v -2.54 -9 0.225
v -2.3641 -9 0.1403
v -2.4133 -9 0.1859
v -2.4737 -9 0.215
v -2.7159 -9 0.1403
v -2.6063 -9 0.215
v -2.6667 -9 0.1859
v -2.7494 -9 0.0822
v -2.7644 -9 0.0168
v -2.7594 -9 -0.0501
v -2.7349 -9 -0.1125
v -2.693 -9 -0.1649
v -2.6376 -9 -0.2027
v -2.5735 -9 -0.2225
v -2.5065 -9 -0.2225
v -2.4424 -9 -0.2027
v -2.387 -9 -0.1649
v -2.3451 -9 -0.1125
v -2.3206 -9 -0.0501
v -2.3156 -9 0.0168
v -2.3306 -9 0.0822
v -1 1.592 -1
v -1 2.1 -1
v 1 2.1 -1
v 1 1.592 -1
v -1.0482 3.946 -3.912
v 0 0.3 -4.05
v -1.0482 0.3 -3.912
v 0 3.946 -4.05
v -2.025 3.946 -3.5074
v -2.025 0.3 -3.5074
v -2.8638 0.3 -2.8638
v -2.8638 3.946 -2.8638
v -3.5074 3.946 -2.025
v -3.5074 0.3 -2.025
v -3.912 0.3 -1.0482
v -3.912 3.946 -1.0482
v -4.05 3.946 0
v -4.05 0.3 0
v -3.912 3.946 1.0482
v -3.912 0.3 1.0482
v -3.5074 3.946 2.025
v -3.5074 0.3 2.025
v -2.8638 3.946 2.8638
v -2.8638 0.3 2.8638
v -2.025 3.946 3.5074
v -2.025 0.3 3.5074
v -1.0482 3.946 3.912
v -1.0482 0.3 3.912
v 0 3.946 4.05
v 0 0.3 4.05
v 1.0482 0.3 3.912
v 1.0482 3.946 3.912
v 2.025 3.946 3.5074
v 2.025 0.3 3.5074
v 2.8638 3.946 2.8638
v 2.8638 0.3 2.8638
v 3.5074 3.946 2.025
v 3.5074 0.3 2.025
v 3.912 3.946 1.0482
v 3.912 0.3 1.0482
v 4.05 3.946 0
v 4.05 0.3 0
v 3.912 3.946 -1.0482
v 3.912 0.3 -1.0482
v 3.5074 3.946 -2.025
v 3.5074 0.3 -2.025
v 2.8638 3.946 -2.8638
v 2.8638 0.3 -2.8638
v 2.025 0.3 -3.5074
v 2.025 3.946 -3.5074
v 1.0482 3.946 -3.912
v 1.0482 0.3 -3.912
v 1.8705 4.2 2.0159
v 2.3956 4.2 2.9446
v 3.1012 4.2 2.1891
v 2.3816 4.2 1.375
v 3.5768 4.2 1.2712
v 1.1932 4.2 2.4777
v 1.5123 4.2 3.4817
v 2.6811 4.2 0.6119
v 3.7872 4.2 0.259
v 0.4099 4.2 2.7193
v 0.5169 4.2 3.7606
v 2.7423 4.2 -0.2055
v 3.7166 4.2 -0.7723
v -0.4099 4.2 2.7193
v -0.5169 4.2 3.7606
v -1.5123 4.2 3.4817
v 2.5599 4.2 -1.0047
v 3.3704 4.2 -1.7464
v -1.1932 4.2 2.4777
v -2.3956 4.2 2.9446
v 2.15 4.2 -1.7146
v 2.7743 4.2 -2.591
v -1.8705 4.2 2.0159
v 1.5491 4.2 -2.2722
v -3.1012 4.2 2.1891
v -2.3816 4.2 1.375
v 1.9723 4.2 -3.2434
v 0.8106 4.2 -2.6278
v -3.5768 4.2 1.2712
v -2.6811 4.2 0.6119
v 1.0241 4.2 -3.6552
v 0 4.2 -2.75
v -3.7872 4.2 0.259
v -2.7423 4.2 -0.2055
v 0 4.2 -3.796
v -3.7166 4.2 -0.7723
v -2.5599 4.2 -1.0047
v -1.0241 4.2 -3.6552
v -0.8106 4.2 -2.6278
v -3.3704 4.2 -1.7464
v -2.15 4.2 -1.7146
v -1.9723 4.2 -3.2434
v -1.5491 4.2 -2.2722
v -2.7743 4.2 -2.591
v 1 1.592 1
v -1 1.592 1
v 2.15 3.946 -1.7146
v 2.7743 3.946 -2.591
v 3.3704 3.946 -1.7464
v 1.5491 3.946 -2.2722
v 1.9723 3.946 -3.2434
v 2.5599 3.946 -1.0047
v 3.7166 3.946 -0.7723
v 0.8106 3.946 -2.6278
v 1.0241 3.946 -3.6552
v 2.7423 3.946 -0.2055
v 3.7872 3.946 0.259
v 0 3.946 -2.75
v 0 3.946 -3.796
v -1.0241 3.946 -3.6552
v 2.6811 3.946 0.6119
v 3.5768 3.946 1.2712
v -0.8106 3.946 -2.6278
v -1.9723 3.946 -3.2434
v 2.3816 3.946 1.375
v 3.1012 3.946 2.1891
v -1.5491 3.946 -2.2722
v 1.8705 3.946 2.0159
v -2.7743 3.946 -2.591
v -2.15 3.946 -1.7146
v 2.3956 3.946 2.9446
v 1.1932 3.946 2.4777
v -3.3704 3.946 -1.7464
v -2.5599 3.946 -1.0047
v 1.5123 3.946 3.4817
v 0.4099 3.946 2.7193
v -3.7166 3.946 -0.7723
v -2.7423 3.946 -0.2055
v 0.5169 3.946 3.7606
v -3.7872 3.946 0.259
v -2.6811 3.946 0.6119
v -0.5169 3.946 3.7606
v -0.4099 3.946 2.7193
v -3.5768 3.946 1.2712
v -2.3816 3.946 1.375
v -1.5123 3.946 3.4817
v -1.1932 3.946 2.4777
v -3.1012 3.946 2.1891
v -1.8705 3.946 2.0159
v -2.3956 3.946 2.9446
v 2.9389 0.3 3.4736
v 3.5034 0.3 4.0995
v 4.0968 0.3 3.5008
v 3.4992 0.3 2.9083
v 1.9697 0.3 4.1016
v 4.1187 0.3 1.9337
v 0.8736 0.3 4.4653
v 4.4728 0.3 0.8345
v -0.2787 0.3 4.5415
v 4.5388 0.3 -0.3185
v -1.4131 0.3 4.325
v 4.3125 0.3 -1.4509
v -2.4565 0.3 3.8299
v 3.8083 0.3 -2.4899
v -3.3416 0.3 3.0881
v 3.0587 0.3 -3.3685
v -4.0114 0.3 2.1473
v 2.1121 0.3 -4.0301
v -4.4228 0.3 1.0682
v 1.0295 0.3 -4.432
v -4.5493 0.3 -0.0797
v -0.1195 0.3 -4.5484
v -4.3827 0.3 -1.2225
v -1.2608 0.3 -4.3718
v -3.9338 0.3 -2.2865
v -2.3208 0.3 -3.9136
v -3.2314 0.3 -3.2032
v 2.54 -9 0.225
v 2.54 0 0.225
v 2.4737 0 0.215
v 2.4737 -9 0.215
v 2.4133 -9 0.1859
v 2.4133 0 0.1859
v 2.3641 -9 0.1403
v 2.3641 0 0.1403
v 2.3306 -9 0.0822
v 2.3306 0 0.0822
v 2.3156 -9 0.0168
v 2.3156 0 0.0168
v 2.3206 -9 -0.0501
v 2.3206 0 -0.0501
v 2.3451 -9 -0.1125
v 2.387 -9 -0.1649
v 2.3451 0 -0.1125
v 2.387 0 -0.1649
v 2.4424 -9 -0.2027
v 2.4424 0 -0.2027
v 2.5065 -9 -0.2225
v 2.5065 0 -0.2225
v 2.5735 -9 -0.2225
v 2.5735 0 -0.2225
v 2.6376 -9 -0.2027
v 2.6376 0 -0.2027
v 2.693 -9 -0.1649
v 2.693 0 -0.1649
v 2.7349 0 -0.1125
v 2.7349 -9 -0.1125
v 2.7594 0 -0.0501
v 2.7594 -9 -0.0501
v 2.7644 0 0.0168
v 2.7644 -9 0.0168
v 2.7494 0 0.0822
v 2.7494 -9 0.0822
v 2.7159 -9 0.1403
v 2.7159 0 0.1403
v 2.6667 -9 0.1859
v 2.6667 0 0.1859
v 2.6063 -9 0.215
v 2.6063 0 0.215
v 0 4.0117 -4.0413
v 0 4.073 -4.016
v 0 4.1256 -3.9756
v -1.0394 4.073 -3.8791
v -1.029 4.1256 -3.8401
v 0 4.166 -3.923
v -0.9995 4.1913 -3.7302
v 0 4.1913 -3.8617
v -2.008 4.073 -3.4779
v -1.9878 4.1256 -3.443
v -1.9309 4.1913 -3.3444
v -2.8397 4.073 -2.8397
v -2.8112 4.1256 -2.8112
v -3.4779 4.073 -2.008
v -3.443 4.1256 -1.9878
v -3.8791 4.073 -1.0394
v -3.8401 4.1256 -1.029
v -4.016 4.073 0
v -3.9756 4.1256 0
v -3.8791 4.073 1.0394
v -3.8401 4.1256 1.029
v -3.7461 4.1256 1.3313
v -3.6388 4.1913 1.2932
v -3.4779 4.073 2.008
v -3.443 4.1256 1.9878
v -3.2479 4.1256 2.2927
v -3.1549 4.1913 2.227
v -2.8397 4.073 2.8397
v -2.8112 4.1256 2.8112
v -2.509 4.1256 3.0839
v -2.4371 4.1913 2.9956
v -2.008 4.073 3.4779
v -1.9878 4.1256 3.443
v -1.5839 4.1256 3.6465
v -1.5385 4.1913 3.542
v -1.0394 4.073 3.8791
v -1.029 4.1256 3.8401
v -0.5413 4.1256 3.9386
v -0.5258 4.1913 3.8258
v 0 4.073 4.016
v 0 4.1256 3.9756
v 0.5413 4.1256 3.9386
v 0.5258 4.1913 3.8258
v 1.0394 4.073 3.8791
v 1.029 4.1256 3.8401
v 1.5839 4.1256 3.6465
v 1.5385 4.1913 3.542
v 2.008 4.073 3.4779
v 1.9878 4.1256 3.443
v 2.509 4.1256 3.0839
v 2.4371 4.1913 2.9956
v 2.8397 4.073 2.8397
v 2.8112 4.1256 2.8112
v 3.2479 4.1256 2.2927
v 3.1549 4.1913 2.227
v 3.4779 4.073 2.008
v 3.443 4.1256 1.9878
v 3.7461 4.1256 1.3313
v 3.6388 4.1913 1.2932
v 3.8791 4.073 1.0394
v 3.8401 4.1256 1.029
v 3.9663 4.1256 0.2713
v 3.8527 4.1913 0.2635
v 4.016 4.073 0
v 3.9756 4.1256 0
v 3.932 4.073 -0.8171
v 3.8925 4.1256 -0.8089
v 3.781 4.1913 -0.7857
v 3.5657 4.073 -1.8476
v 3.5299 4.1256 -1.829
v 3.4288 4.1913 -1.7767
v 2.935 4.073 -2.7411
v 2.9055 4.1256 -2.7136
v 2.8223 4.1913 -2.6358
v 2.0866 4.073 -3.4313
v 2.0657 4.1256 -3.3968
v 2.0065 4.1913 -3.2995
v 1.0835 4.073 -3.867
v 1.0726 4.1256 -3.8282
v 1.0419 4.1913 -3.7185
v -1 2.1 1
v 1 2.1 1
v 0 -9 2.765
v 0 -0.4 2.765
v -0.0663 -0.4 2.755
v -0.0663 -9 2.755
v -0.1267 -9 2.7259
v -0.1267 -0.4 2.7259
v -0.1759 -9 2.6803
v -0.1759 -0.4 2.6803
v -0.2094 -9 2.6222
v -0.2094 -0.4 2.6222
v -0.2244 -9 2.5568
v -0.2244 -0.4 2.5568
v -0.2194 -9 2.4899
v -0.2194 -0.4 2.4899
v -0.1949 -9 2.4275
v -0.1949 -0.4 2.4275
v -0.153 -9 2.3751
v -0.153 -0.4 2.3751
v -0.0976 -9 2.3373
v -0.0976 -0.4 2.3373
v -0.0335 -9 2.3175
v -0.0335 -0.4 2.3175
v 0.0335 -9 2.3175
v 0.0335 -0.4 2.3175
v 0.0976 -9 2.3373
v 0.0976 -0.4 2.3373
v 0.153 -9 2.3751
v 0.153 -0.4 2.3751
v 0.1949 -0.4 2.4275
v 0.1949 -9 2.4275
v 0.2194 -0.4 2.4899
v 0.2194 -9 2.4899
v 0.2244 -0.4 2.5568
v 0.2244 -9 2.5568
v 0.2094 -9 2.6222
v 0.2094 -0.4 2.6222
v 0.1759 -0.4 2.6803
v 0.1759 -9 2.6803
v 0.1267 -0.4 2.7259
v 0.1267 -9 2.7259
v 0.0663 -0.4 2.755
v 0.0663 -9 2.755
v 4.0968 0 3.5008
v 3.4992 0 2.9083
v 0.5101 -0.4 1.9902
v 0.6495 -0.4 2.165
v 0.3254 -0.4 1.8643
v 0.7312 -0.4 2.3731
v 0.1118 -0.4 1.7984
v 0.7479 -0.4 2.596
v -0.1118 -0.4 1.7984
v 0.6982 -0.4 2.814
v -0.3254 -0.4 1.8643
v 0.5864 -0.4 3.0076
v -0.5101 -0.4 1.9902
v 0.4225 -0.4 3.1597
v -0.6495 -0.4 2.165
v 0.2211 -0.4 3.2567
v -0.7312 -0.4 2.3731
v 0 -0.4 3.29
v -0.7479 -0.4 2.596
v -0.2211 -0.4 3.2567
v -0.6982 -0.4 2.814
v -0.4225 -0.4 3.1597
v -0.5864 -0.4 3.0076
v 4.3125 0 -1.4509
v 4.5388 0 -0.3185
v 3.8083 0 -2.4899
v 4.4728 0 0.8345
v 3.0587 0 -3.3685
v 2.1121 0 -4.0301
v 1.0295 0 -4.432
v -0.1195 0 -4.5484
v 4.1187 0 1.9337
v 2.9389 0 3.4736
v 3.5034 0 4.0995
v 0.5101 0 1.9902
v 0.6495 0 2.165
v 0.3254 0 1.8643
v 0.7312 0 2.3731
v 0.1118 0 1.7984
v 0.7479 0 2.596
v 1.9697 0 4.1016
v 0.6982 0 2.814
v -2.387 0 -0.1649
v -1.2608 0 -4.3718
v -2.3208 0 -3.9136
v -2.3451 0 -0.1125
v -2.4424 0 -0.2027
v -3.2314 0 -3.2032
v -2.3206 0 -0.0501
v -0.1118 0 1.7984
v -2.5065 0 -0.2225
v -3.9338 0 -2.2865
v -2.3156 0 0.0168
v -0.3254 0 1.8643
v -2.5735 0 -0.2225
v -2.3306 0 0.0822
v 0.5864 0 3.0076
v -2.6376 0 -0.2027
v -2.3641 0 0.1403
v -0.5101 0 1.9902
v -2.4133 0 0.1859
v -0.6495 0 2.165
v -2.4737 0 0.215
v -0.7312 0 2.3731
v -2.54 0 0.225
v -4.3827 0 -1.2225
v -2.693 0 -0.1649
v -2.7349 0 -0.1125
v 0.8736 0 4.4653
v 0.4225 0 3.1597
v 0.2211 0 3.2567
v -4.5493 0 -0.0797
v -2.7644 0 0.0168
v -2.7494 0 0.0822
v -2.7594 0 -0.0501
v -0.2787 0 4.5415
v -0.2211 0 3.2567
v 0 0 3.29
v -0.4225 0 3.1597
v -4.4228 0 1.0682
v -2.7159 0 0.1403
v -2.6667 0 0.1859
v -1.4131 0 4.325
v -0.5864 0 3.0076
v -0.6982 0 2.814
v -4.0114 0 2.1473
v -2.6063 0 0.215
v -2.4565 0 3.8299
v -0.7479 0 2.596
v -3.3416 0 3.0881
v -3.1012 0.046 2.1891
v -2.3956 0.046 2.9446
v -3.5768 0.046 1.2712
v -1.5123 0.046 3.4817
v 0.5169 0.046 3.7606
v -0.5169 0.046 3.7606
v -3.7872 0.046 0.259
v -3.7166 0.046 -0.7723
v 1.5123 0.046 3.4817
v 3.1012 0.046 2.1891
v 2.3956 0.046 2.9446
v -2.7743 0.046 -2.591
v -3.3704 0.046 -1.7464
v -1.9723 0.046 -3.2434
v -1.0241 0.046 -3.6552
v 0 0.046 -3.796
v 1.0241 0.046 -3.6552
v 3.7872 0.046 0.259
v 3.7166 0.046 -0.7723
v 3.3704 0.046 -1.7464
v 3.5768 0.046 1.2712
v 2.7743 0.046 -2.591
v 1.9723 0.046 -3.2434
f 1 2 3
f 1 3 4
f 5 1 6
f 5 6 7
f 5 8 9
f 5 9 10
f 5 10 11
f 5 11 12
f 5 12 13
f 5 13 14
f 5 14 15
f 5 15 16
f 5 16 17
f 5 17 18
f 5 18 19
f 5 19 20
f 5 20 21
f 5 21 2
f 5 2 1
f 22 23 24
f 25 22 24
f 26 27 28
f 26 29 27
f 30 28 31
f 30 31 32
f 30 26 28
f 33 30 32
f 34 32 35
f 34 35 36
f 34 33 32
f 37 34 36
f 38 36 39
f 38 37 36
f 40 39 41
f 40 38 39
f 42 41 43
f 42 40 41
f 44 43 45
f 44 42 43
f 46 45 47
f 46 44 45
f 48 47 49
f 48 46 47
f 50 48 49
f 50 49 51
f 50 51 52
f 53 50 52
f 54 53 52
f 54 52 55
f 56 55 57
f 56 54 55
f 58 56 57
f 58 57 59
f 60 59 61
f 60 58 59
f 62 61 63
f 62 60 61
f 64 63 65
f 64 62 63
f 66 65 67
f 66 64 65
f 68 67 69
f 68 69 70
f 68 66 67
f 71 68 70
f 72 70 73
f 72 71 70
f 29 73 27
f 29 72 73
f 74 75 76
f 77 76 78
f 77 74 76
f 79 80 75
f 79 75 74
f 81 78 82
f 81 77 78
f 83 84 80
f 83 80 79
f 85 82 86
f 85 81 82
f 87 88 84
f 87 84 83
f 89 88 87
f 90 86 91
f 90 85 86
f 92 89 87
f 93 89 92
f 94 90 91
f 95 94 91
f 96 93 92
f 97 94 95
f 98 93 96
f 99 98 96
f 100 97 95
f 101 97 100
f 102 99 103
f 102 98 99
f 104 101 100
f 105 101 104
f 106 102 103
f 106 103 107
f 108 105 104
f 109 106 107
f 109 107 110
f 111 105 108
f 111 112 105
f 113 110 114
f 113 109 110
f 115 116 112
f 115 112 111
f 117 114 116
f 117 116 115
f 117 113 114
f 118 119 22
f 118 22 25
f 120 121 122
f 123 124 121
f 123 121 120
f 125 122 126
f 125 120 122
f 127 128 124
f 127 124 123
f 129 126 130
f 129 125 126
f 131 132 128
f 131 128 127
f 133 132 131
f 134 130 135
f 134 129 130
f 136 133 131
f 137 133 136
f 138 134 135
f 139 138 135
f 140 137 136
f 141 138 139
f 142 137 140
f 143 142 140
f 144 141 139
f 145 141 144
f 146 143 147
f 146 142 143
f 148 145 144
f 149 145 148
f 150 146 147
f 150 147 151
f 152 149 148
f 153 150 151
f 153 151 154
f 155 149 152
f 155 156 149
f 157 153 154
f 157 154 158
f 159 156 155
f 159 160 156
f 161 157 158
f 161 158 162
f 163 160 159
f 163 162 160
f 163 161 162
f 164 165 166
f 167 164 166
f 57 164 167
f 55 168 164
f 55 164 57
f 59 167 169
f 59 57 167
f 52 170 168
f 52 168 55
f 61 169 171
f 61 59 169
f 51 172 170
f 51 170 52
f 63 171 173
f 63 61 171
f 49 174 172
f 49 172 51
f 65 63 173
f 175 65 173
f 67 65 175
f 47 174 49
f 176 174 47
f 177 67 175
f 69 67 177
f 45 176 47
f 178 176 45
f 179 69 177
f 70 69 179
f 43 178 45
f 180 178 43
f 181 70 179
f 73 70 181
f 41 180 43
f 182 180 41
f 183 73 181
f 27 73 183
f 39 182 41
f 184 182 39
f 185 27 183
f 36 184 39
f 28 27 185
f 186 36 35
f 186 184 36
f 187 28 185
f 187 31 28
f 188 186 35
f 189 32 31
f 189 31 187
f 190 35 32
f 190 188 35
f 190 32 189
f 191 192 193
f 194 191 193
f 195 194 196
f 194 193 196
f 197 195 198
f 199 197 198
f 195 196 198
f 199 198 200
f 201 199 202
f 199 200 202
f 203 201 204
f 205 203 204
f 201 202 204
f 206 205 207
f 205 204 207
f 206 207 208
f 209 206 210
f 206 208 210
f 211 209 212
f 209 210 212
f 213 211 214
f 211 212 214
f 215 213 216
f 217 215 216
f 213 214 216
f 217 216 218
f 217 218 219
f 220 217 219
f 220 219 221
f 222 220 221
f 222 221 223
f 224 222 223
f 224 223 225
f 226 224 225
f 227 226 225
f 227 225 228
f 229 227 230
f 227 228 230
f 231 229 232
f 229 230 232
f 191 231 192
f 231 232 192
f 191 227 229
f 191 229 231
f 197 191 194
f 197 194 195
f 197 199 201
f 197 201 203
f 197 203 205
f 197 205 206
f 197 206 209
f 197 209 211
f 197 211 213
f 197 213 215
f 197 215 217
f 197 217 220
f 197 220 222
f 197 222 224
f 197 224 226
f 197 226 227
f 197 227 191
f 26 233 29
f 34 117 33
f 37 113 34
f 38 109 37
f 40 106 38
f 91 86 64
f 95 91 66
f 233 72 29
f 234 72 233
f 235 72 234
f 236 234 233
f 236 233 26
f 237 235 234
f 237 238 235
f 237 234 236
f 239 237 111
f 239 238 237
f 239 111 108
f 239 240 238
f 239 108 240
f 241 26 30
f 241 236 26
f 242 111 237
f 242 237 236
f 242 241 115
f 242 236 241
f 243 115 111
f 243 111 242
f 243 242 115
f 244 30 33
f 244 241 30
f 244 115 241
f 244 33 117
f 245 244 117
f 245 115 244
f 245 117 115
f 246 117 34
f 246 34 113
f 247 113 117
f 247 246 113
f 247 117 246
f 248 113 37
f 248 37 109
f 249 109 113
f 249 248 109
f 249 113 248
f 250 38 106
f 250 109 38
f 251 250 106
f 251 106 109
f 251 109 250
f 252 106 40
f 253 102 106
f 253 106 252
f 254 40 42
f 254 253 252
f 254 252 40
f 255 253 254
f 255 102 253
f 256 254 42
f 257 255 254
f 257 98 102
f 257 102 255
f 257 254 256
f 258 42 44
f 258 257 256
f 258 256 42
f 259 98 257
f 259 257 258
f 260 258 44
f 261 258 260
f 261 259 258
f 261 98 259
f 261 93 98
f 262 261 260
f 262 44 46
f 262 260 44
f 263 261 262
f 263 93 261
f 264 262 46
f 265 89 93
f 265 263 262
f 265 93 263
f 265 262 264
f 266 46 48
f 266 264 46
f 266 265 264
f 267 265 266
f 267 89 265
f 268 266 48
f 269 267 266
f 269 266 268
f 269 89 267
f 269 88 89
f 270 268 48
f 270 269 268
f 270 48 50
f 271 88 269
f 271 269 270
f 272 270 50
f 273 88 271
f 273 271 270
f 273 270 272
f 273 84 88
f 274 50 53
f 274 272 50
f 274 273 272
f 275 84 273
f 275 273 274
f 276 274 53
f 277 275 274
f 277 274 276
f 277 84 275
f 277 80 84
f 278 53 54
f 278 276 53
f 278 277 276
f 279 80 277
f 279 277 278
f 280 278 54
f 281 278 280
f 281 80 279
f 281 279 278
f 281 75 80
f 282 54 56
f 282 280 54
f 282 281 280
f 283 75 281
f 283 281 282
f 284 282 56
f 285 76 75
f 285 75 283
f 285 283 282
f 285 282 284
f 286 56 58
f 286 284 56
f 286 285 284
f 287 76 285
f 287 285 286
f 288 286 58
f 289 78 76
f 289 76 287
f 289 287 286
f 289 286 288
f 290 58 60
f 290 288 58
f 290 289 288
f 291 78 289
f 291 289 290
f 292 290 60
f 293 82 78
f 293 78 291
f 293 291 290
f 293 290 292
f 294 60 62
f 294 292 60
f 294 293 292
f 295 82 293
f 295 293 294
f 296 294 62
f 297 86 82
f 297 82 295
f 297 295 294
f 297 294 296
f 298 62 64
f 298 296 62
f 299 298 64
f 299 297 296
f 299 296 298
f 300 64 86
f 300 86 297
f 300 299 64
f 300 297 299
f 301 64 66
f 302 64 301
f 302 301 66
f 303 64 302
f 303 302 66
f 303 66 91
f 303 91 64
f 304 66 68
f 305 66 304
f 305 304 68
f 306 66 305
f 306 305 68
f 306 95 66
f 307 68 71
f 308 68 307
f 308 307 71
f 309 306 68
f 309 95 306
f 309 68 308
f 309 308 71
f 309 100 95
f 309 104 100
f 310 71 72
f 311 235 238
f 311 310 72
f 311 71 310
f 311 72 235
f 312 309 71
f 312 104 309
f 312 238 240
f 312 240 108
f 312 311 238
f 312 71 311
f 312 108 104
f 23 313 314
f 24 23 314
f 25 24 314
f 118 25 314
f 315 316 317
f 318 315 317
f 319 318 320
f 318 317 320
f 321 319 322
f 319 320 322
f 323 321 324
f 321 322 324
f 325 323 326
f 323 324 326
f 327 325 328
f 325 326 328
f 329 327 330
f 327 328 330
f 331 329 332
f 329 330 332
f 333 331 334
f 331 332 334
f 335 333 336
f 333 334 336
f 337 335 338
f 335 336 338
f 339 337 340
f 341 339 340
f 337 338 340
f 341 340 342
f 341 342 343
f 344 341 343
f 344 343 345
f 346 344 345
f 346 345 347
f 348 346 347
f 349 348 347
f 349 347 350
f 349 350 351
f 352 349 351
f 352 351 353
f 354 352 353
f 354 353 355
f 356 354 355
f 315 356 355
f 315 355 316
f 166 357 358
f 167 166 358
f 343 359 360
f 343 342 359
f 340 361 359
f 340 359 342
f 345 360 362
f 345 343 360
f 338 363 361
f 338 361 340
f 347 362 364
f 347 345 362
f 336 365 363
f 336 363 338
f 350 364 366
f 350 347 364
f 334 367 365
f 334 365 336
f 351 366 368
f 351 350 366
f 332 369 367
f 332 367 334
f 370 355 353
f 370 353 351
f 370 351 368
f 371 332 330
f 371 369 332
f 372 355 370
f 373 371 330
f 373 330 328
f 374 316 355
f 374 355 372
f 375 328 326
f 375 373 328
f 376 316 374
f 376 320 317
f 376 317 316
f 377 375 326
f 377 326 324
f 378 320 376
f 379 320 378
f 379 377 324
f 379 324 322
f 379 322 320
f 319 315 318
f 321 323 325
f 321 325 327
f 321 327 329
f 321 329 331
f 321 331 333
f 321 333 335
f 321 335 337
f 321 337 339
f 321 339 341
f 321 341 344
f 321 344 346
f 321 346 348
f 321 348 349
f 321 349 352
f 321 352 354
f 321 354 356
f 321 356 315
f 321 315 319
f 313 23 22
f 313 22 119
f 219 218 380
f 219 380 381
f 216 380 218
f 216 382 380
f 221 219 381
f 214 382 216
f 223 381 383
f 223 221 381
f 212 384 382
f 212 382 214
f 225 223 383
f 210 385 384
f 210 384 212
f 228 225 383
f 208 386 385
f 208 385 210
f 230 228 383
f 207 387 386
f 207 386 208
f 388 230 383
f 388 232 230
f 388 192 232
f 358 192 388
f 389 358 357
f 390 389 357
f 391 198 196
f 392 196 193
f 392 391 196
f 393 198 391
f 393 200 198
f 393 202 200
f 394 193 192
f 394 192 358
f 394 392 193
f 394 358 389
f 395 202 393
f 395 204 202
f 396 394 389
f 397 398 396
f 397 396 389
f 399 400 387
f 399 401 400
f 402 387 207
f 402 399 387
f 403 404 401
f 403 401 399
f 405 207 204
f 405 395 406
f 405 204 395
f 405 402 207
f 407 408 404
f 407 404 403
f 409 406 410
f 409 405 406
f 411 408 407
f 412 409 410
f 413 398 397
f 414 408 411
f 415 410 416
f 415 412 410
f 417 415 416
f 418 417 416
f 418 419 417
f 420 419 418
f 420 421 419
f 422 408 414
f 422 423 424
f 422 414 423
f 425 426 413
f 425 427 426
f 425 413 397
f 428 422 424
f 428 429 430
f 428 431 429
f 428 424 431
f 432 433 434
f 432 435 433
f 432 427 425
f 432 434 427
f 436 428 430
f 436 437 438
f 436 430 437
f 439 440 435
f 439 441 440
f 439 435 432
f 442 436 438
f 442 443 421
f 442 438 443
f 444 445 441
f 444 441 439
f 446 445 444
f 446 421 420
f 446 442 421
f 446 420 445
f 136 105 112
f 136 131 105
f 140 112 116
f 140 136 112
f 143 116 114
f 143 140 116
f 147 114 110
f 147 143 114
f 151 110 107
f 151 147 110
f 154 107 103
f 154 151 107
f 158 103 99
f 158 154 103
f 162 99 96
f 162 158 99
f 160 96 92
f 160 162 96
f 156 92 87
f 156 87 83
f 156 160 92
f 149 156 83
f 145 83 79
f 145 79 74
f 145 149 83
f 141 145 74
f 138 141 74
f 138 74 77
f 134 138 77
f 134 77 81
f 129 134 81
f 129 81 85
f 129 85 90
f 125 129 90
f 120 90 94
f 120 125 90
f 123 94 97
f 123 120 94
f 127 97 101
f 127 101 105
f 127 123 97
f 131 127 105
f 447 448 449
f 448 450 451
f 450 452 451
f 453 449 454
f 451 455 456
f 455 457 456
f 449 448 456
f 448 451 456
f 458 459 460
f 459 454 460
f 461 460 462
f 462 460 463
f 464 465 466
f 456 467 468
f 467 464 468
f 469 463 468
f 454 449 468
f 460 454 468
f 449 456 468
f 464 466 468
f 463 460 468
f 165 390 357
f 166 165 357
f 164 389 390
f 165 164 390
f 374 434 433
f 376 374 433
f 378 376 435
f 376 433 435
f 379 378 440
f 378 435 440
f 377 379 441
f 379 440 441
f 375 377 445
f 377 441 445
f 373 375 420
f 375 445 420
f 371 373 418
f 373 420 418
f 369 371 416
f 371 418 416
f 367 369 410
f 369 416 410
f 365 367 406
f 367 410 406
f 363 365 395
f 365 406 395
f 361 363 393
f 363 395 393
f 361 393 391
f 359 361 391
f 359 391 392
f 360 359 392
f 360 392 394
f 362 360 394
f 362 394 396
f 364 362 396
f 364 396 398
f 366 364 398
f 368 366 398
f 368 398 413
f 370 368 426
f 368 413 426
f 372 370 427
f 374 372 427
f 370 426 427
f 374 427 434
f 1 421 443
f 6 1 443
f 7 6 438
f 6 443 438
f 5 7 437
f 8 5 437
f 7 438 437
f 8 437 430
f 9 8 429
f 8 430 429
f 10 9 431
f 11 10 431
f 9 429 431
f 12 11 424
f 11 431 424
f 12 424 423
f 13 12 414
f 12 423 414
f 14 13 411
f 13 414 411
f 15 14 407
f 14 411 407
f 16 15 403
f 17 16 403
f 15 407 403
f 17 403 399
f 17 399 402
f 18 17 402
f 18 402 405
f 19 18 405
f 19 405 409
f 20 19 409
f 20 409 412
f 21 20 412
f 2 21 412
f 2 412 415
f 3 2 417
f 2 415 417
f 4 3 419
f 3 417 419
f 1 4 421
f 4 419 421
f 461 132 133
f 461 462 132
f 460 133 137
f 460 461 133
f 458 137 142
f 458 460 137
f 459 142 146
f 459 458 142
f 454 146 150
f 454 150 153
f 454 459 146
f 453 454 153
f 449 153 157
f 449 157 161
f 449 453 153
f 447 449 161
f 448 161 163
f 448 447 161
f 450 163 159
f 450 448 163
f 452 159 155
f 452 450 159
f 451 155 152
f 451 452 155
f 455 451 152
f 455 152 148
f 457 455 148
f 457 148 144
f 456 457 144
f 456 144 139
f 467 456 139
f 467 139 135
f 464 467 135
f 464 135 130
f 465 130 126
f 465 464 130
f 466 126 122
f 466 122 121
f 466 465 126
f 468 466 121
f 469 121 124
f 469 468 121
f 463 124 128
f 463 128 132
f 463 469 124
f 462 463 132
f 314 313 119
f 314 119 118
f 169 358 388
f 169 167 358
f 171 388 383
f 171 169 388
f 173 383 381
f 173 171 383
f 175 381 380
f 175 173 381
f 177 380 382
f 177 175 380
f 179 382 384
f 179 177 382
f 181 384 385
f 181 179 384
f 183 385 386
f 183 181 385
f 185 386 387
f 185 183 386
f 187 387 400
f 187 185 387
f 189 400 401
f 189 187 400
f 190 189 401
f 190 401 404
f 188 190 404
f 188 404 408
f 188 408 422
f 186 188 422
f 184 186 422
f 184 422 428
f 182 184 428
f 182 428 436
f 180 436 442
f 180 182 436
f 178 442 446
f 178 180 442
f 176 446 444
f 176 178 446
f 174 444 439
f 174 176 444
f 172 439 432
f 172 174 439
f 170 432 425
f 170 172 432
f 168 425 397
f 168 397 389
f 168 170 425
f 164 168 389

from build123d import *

# Parameters (mm, degrees)
SKETCH2_R           = 4.55
BOSS_EXTRUDE1_DEPTH = 0.046
BOSS_EXTRUDE2_START = -2.1
SKETCH3_W           = 2
SKETCH3_H           = 2
BOSS_EXTRUDE2_DEPTH = 0.508
BOSS_EXTRUDE3_DEPTH = 0.3
SKETCH5_R           = 0.225
BOSS_EXTRUDE4_DEPTH = 9
SKETCH7_R           = 0.75
BOSS_EXTRUDE5_DEPTH = 0.4


with BuildPart() as part:
    # Sketch1 → Revolve-Thin2 (revolve)
    with BuildSketch(Plane.XY, mode=Mode.PRIVATE) as revolve_thin2_sk:
        with BuildLine():
            Line((4.55, 0), (4.55, 0.3))
            Line((4.55, 0.3), (4.05, 0.3))
            Line((4.05, 0.3), (4.05, 3.946))
            ThreePointArc((4.05, 3.946), (3.975605122, 4.125605122), (3.796, 4.2))
            Line((3.796, 4.2), (2.75, 4.2))
            Line((2.75, 4.2), (2.75, 3.946))
            Line((2.75, 3.946), (3.796, 3.946))
            Line((3.796, 3.946), (3.796, 0.046))
            Line((3.796, 0.046), (4.296, 0.046))
            Line((4.296, 0.046), (4.296, 0))
            Line((4.296, 0), (4.55, 0))
        make_face()
    revolve(revolve_thin2_sk.sketch.rotate(Axis((0, 0, 0), (0, 1, 0)), 90), axis=Axis((0, 0, 0), (0, 1, 0)))  # turned: the seam where the file's is

    # Sketch2 → Boss-Extrude1 (add)
    with BuildSketch(Plane.XZ):
        with Locations(Location((0, 0, 0), (0, 0, 270))):  # turned: the seam where the file's is
            Circle(SKETCH2_R)
    extrude(amount=-BOSS_EXTRUDE1_DEPTH)

    # Sketch4 → Boss-Extrude3 (add)
    with BuildSketch(Plane.XZ):
        Polygon((3.499150564, 2.908340649), (2.938865798, 3.473552623), (3.503435617, 4.099455918), (4.096846657, 3.500826355), align=None)
    extrude(amount=-BOSS_EXTRUDE3_DEPTH)

    # Sketch5 → Boss-Extrude4 (add)
    with BuildSketch(Plane.XZ):
        with Locations(Location((-2.54, 0, 0), (0, 0, 90))):  # turned: the seam where the file's is
            Circle(SKETCH5_R)
        with Locations(Location((2.54, 0, 0), (0, 0, 90))):  # turned: the seam where the file's is
            Circle(SKETCH5_R)
        with Locations(Location((0, 2.54, 0), (0, 0, 90))):  # turned: the seam where the file's is
            Circle(SKETCH5_R)
    extrude(amount=BOSS_EXTRUDE4_DEPTH)

    # Sketch7 → Boss-Extrude5 (add)
    with BuildSketch(Plane.XZ):
        with Locations(Location((0, 2.54, 0), (0, 0, 90))):  # turned: the seam where the file's is
            Circle(SKETCH7_R)
    extrude(amount=BOSS_EXTRUDE5_DEPTH)


with BuildPart() as body_2:
    # Sketch3 → Boss-Extrude2 (new body)
    with BuildSketch(Plane.XZ.offset(BOSS_EXTRUDE2_START)):
        Rectangle(SKETCH3_W, SKETCH3_H)
    extrude(amount=BOSS_EXTRUDE2_DEPTH)


solid = Compound([part.part, body_2.part])
